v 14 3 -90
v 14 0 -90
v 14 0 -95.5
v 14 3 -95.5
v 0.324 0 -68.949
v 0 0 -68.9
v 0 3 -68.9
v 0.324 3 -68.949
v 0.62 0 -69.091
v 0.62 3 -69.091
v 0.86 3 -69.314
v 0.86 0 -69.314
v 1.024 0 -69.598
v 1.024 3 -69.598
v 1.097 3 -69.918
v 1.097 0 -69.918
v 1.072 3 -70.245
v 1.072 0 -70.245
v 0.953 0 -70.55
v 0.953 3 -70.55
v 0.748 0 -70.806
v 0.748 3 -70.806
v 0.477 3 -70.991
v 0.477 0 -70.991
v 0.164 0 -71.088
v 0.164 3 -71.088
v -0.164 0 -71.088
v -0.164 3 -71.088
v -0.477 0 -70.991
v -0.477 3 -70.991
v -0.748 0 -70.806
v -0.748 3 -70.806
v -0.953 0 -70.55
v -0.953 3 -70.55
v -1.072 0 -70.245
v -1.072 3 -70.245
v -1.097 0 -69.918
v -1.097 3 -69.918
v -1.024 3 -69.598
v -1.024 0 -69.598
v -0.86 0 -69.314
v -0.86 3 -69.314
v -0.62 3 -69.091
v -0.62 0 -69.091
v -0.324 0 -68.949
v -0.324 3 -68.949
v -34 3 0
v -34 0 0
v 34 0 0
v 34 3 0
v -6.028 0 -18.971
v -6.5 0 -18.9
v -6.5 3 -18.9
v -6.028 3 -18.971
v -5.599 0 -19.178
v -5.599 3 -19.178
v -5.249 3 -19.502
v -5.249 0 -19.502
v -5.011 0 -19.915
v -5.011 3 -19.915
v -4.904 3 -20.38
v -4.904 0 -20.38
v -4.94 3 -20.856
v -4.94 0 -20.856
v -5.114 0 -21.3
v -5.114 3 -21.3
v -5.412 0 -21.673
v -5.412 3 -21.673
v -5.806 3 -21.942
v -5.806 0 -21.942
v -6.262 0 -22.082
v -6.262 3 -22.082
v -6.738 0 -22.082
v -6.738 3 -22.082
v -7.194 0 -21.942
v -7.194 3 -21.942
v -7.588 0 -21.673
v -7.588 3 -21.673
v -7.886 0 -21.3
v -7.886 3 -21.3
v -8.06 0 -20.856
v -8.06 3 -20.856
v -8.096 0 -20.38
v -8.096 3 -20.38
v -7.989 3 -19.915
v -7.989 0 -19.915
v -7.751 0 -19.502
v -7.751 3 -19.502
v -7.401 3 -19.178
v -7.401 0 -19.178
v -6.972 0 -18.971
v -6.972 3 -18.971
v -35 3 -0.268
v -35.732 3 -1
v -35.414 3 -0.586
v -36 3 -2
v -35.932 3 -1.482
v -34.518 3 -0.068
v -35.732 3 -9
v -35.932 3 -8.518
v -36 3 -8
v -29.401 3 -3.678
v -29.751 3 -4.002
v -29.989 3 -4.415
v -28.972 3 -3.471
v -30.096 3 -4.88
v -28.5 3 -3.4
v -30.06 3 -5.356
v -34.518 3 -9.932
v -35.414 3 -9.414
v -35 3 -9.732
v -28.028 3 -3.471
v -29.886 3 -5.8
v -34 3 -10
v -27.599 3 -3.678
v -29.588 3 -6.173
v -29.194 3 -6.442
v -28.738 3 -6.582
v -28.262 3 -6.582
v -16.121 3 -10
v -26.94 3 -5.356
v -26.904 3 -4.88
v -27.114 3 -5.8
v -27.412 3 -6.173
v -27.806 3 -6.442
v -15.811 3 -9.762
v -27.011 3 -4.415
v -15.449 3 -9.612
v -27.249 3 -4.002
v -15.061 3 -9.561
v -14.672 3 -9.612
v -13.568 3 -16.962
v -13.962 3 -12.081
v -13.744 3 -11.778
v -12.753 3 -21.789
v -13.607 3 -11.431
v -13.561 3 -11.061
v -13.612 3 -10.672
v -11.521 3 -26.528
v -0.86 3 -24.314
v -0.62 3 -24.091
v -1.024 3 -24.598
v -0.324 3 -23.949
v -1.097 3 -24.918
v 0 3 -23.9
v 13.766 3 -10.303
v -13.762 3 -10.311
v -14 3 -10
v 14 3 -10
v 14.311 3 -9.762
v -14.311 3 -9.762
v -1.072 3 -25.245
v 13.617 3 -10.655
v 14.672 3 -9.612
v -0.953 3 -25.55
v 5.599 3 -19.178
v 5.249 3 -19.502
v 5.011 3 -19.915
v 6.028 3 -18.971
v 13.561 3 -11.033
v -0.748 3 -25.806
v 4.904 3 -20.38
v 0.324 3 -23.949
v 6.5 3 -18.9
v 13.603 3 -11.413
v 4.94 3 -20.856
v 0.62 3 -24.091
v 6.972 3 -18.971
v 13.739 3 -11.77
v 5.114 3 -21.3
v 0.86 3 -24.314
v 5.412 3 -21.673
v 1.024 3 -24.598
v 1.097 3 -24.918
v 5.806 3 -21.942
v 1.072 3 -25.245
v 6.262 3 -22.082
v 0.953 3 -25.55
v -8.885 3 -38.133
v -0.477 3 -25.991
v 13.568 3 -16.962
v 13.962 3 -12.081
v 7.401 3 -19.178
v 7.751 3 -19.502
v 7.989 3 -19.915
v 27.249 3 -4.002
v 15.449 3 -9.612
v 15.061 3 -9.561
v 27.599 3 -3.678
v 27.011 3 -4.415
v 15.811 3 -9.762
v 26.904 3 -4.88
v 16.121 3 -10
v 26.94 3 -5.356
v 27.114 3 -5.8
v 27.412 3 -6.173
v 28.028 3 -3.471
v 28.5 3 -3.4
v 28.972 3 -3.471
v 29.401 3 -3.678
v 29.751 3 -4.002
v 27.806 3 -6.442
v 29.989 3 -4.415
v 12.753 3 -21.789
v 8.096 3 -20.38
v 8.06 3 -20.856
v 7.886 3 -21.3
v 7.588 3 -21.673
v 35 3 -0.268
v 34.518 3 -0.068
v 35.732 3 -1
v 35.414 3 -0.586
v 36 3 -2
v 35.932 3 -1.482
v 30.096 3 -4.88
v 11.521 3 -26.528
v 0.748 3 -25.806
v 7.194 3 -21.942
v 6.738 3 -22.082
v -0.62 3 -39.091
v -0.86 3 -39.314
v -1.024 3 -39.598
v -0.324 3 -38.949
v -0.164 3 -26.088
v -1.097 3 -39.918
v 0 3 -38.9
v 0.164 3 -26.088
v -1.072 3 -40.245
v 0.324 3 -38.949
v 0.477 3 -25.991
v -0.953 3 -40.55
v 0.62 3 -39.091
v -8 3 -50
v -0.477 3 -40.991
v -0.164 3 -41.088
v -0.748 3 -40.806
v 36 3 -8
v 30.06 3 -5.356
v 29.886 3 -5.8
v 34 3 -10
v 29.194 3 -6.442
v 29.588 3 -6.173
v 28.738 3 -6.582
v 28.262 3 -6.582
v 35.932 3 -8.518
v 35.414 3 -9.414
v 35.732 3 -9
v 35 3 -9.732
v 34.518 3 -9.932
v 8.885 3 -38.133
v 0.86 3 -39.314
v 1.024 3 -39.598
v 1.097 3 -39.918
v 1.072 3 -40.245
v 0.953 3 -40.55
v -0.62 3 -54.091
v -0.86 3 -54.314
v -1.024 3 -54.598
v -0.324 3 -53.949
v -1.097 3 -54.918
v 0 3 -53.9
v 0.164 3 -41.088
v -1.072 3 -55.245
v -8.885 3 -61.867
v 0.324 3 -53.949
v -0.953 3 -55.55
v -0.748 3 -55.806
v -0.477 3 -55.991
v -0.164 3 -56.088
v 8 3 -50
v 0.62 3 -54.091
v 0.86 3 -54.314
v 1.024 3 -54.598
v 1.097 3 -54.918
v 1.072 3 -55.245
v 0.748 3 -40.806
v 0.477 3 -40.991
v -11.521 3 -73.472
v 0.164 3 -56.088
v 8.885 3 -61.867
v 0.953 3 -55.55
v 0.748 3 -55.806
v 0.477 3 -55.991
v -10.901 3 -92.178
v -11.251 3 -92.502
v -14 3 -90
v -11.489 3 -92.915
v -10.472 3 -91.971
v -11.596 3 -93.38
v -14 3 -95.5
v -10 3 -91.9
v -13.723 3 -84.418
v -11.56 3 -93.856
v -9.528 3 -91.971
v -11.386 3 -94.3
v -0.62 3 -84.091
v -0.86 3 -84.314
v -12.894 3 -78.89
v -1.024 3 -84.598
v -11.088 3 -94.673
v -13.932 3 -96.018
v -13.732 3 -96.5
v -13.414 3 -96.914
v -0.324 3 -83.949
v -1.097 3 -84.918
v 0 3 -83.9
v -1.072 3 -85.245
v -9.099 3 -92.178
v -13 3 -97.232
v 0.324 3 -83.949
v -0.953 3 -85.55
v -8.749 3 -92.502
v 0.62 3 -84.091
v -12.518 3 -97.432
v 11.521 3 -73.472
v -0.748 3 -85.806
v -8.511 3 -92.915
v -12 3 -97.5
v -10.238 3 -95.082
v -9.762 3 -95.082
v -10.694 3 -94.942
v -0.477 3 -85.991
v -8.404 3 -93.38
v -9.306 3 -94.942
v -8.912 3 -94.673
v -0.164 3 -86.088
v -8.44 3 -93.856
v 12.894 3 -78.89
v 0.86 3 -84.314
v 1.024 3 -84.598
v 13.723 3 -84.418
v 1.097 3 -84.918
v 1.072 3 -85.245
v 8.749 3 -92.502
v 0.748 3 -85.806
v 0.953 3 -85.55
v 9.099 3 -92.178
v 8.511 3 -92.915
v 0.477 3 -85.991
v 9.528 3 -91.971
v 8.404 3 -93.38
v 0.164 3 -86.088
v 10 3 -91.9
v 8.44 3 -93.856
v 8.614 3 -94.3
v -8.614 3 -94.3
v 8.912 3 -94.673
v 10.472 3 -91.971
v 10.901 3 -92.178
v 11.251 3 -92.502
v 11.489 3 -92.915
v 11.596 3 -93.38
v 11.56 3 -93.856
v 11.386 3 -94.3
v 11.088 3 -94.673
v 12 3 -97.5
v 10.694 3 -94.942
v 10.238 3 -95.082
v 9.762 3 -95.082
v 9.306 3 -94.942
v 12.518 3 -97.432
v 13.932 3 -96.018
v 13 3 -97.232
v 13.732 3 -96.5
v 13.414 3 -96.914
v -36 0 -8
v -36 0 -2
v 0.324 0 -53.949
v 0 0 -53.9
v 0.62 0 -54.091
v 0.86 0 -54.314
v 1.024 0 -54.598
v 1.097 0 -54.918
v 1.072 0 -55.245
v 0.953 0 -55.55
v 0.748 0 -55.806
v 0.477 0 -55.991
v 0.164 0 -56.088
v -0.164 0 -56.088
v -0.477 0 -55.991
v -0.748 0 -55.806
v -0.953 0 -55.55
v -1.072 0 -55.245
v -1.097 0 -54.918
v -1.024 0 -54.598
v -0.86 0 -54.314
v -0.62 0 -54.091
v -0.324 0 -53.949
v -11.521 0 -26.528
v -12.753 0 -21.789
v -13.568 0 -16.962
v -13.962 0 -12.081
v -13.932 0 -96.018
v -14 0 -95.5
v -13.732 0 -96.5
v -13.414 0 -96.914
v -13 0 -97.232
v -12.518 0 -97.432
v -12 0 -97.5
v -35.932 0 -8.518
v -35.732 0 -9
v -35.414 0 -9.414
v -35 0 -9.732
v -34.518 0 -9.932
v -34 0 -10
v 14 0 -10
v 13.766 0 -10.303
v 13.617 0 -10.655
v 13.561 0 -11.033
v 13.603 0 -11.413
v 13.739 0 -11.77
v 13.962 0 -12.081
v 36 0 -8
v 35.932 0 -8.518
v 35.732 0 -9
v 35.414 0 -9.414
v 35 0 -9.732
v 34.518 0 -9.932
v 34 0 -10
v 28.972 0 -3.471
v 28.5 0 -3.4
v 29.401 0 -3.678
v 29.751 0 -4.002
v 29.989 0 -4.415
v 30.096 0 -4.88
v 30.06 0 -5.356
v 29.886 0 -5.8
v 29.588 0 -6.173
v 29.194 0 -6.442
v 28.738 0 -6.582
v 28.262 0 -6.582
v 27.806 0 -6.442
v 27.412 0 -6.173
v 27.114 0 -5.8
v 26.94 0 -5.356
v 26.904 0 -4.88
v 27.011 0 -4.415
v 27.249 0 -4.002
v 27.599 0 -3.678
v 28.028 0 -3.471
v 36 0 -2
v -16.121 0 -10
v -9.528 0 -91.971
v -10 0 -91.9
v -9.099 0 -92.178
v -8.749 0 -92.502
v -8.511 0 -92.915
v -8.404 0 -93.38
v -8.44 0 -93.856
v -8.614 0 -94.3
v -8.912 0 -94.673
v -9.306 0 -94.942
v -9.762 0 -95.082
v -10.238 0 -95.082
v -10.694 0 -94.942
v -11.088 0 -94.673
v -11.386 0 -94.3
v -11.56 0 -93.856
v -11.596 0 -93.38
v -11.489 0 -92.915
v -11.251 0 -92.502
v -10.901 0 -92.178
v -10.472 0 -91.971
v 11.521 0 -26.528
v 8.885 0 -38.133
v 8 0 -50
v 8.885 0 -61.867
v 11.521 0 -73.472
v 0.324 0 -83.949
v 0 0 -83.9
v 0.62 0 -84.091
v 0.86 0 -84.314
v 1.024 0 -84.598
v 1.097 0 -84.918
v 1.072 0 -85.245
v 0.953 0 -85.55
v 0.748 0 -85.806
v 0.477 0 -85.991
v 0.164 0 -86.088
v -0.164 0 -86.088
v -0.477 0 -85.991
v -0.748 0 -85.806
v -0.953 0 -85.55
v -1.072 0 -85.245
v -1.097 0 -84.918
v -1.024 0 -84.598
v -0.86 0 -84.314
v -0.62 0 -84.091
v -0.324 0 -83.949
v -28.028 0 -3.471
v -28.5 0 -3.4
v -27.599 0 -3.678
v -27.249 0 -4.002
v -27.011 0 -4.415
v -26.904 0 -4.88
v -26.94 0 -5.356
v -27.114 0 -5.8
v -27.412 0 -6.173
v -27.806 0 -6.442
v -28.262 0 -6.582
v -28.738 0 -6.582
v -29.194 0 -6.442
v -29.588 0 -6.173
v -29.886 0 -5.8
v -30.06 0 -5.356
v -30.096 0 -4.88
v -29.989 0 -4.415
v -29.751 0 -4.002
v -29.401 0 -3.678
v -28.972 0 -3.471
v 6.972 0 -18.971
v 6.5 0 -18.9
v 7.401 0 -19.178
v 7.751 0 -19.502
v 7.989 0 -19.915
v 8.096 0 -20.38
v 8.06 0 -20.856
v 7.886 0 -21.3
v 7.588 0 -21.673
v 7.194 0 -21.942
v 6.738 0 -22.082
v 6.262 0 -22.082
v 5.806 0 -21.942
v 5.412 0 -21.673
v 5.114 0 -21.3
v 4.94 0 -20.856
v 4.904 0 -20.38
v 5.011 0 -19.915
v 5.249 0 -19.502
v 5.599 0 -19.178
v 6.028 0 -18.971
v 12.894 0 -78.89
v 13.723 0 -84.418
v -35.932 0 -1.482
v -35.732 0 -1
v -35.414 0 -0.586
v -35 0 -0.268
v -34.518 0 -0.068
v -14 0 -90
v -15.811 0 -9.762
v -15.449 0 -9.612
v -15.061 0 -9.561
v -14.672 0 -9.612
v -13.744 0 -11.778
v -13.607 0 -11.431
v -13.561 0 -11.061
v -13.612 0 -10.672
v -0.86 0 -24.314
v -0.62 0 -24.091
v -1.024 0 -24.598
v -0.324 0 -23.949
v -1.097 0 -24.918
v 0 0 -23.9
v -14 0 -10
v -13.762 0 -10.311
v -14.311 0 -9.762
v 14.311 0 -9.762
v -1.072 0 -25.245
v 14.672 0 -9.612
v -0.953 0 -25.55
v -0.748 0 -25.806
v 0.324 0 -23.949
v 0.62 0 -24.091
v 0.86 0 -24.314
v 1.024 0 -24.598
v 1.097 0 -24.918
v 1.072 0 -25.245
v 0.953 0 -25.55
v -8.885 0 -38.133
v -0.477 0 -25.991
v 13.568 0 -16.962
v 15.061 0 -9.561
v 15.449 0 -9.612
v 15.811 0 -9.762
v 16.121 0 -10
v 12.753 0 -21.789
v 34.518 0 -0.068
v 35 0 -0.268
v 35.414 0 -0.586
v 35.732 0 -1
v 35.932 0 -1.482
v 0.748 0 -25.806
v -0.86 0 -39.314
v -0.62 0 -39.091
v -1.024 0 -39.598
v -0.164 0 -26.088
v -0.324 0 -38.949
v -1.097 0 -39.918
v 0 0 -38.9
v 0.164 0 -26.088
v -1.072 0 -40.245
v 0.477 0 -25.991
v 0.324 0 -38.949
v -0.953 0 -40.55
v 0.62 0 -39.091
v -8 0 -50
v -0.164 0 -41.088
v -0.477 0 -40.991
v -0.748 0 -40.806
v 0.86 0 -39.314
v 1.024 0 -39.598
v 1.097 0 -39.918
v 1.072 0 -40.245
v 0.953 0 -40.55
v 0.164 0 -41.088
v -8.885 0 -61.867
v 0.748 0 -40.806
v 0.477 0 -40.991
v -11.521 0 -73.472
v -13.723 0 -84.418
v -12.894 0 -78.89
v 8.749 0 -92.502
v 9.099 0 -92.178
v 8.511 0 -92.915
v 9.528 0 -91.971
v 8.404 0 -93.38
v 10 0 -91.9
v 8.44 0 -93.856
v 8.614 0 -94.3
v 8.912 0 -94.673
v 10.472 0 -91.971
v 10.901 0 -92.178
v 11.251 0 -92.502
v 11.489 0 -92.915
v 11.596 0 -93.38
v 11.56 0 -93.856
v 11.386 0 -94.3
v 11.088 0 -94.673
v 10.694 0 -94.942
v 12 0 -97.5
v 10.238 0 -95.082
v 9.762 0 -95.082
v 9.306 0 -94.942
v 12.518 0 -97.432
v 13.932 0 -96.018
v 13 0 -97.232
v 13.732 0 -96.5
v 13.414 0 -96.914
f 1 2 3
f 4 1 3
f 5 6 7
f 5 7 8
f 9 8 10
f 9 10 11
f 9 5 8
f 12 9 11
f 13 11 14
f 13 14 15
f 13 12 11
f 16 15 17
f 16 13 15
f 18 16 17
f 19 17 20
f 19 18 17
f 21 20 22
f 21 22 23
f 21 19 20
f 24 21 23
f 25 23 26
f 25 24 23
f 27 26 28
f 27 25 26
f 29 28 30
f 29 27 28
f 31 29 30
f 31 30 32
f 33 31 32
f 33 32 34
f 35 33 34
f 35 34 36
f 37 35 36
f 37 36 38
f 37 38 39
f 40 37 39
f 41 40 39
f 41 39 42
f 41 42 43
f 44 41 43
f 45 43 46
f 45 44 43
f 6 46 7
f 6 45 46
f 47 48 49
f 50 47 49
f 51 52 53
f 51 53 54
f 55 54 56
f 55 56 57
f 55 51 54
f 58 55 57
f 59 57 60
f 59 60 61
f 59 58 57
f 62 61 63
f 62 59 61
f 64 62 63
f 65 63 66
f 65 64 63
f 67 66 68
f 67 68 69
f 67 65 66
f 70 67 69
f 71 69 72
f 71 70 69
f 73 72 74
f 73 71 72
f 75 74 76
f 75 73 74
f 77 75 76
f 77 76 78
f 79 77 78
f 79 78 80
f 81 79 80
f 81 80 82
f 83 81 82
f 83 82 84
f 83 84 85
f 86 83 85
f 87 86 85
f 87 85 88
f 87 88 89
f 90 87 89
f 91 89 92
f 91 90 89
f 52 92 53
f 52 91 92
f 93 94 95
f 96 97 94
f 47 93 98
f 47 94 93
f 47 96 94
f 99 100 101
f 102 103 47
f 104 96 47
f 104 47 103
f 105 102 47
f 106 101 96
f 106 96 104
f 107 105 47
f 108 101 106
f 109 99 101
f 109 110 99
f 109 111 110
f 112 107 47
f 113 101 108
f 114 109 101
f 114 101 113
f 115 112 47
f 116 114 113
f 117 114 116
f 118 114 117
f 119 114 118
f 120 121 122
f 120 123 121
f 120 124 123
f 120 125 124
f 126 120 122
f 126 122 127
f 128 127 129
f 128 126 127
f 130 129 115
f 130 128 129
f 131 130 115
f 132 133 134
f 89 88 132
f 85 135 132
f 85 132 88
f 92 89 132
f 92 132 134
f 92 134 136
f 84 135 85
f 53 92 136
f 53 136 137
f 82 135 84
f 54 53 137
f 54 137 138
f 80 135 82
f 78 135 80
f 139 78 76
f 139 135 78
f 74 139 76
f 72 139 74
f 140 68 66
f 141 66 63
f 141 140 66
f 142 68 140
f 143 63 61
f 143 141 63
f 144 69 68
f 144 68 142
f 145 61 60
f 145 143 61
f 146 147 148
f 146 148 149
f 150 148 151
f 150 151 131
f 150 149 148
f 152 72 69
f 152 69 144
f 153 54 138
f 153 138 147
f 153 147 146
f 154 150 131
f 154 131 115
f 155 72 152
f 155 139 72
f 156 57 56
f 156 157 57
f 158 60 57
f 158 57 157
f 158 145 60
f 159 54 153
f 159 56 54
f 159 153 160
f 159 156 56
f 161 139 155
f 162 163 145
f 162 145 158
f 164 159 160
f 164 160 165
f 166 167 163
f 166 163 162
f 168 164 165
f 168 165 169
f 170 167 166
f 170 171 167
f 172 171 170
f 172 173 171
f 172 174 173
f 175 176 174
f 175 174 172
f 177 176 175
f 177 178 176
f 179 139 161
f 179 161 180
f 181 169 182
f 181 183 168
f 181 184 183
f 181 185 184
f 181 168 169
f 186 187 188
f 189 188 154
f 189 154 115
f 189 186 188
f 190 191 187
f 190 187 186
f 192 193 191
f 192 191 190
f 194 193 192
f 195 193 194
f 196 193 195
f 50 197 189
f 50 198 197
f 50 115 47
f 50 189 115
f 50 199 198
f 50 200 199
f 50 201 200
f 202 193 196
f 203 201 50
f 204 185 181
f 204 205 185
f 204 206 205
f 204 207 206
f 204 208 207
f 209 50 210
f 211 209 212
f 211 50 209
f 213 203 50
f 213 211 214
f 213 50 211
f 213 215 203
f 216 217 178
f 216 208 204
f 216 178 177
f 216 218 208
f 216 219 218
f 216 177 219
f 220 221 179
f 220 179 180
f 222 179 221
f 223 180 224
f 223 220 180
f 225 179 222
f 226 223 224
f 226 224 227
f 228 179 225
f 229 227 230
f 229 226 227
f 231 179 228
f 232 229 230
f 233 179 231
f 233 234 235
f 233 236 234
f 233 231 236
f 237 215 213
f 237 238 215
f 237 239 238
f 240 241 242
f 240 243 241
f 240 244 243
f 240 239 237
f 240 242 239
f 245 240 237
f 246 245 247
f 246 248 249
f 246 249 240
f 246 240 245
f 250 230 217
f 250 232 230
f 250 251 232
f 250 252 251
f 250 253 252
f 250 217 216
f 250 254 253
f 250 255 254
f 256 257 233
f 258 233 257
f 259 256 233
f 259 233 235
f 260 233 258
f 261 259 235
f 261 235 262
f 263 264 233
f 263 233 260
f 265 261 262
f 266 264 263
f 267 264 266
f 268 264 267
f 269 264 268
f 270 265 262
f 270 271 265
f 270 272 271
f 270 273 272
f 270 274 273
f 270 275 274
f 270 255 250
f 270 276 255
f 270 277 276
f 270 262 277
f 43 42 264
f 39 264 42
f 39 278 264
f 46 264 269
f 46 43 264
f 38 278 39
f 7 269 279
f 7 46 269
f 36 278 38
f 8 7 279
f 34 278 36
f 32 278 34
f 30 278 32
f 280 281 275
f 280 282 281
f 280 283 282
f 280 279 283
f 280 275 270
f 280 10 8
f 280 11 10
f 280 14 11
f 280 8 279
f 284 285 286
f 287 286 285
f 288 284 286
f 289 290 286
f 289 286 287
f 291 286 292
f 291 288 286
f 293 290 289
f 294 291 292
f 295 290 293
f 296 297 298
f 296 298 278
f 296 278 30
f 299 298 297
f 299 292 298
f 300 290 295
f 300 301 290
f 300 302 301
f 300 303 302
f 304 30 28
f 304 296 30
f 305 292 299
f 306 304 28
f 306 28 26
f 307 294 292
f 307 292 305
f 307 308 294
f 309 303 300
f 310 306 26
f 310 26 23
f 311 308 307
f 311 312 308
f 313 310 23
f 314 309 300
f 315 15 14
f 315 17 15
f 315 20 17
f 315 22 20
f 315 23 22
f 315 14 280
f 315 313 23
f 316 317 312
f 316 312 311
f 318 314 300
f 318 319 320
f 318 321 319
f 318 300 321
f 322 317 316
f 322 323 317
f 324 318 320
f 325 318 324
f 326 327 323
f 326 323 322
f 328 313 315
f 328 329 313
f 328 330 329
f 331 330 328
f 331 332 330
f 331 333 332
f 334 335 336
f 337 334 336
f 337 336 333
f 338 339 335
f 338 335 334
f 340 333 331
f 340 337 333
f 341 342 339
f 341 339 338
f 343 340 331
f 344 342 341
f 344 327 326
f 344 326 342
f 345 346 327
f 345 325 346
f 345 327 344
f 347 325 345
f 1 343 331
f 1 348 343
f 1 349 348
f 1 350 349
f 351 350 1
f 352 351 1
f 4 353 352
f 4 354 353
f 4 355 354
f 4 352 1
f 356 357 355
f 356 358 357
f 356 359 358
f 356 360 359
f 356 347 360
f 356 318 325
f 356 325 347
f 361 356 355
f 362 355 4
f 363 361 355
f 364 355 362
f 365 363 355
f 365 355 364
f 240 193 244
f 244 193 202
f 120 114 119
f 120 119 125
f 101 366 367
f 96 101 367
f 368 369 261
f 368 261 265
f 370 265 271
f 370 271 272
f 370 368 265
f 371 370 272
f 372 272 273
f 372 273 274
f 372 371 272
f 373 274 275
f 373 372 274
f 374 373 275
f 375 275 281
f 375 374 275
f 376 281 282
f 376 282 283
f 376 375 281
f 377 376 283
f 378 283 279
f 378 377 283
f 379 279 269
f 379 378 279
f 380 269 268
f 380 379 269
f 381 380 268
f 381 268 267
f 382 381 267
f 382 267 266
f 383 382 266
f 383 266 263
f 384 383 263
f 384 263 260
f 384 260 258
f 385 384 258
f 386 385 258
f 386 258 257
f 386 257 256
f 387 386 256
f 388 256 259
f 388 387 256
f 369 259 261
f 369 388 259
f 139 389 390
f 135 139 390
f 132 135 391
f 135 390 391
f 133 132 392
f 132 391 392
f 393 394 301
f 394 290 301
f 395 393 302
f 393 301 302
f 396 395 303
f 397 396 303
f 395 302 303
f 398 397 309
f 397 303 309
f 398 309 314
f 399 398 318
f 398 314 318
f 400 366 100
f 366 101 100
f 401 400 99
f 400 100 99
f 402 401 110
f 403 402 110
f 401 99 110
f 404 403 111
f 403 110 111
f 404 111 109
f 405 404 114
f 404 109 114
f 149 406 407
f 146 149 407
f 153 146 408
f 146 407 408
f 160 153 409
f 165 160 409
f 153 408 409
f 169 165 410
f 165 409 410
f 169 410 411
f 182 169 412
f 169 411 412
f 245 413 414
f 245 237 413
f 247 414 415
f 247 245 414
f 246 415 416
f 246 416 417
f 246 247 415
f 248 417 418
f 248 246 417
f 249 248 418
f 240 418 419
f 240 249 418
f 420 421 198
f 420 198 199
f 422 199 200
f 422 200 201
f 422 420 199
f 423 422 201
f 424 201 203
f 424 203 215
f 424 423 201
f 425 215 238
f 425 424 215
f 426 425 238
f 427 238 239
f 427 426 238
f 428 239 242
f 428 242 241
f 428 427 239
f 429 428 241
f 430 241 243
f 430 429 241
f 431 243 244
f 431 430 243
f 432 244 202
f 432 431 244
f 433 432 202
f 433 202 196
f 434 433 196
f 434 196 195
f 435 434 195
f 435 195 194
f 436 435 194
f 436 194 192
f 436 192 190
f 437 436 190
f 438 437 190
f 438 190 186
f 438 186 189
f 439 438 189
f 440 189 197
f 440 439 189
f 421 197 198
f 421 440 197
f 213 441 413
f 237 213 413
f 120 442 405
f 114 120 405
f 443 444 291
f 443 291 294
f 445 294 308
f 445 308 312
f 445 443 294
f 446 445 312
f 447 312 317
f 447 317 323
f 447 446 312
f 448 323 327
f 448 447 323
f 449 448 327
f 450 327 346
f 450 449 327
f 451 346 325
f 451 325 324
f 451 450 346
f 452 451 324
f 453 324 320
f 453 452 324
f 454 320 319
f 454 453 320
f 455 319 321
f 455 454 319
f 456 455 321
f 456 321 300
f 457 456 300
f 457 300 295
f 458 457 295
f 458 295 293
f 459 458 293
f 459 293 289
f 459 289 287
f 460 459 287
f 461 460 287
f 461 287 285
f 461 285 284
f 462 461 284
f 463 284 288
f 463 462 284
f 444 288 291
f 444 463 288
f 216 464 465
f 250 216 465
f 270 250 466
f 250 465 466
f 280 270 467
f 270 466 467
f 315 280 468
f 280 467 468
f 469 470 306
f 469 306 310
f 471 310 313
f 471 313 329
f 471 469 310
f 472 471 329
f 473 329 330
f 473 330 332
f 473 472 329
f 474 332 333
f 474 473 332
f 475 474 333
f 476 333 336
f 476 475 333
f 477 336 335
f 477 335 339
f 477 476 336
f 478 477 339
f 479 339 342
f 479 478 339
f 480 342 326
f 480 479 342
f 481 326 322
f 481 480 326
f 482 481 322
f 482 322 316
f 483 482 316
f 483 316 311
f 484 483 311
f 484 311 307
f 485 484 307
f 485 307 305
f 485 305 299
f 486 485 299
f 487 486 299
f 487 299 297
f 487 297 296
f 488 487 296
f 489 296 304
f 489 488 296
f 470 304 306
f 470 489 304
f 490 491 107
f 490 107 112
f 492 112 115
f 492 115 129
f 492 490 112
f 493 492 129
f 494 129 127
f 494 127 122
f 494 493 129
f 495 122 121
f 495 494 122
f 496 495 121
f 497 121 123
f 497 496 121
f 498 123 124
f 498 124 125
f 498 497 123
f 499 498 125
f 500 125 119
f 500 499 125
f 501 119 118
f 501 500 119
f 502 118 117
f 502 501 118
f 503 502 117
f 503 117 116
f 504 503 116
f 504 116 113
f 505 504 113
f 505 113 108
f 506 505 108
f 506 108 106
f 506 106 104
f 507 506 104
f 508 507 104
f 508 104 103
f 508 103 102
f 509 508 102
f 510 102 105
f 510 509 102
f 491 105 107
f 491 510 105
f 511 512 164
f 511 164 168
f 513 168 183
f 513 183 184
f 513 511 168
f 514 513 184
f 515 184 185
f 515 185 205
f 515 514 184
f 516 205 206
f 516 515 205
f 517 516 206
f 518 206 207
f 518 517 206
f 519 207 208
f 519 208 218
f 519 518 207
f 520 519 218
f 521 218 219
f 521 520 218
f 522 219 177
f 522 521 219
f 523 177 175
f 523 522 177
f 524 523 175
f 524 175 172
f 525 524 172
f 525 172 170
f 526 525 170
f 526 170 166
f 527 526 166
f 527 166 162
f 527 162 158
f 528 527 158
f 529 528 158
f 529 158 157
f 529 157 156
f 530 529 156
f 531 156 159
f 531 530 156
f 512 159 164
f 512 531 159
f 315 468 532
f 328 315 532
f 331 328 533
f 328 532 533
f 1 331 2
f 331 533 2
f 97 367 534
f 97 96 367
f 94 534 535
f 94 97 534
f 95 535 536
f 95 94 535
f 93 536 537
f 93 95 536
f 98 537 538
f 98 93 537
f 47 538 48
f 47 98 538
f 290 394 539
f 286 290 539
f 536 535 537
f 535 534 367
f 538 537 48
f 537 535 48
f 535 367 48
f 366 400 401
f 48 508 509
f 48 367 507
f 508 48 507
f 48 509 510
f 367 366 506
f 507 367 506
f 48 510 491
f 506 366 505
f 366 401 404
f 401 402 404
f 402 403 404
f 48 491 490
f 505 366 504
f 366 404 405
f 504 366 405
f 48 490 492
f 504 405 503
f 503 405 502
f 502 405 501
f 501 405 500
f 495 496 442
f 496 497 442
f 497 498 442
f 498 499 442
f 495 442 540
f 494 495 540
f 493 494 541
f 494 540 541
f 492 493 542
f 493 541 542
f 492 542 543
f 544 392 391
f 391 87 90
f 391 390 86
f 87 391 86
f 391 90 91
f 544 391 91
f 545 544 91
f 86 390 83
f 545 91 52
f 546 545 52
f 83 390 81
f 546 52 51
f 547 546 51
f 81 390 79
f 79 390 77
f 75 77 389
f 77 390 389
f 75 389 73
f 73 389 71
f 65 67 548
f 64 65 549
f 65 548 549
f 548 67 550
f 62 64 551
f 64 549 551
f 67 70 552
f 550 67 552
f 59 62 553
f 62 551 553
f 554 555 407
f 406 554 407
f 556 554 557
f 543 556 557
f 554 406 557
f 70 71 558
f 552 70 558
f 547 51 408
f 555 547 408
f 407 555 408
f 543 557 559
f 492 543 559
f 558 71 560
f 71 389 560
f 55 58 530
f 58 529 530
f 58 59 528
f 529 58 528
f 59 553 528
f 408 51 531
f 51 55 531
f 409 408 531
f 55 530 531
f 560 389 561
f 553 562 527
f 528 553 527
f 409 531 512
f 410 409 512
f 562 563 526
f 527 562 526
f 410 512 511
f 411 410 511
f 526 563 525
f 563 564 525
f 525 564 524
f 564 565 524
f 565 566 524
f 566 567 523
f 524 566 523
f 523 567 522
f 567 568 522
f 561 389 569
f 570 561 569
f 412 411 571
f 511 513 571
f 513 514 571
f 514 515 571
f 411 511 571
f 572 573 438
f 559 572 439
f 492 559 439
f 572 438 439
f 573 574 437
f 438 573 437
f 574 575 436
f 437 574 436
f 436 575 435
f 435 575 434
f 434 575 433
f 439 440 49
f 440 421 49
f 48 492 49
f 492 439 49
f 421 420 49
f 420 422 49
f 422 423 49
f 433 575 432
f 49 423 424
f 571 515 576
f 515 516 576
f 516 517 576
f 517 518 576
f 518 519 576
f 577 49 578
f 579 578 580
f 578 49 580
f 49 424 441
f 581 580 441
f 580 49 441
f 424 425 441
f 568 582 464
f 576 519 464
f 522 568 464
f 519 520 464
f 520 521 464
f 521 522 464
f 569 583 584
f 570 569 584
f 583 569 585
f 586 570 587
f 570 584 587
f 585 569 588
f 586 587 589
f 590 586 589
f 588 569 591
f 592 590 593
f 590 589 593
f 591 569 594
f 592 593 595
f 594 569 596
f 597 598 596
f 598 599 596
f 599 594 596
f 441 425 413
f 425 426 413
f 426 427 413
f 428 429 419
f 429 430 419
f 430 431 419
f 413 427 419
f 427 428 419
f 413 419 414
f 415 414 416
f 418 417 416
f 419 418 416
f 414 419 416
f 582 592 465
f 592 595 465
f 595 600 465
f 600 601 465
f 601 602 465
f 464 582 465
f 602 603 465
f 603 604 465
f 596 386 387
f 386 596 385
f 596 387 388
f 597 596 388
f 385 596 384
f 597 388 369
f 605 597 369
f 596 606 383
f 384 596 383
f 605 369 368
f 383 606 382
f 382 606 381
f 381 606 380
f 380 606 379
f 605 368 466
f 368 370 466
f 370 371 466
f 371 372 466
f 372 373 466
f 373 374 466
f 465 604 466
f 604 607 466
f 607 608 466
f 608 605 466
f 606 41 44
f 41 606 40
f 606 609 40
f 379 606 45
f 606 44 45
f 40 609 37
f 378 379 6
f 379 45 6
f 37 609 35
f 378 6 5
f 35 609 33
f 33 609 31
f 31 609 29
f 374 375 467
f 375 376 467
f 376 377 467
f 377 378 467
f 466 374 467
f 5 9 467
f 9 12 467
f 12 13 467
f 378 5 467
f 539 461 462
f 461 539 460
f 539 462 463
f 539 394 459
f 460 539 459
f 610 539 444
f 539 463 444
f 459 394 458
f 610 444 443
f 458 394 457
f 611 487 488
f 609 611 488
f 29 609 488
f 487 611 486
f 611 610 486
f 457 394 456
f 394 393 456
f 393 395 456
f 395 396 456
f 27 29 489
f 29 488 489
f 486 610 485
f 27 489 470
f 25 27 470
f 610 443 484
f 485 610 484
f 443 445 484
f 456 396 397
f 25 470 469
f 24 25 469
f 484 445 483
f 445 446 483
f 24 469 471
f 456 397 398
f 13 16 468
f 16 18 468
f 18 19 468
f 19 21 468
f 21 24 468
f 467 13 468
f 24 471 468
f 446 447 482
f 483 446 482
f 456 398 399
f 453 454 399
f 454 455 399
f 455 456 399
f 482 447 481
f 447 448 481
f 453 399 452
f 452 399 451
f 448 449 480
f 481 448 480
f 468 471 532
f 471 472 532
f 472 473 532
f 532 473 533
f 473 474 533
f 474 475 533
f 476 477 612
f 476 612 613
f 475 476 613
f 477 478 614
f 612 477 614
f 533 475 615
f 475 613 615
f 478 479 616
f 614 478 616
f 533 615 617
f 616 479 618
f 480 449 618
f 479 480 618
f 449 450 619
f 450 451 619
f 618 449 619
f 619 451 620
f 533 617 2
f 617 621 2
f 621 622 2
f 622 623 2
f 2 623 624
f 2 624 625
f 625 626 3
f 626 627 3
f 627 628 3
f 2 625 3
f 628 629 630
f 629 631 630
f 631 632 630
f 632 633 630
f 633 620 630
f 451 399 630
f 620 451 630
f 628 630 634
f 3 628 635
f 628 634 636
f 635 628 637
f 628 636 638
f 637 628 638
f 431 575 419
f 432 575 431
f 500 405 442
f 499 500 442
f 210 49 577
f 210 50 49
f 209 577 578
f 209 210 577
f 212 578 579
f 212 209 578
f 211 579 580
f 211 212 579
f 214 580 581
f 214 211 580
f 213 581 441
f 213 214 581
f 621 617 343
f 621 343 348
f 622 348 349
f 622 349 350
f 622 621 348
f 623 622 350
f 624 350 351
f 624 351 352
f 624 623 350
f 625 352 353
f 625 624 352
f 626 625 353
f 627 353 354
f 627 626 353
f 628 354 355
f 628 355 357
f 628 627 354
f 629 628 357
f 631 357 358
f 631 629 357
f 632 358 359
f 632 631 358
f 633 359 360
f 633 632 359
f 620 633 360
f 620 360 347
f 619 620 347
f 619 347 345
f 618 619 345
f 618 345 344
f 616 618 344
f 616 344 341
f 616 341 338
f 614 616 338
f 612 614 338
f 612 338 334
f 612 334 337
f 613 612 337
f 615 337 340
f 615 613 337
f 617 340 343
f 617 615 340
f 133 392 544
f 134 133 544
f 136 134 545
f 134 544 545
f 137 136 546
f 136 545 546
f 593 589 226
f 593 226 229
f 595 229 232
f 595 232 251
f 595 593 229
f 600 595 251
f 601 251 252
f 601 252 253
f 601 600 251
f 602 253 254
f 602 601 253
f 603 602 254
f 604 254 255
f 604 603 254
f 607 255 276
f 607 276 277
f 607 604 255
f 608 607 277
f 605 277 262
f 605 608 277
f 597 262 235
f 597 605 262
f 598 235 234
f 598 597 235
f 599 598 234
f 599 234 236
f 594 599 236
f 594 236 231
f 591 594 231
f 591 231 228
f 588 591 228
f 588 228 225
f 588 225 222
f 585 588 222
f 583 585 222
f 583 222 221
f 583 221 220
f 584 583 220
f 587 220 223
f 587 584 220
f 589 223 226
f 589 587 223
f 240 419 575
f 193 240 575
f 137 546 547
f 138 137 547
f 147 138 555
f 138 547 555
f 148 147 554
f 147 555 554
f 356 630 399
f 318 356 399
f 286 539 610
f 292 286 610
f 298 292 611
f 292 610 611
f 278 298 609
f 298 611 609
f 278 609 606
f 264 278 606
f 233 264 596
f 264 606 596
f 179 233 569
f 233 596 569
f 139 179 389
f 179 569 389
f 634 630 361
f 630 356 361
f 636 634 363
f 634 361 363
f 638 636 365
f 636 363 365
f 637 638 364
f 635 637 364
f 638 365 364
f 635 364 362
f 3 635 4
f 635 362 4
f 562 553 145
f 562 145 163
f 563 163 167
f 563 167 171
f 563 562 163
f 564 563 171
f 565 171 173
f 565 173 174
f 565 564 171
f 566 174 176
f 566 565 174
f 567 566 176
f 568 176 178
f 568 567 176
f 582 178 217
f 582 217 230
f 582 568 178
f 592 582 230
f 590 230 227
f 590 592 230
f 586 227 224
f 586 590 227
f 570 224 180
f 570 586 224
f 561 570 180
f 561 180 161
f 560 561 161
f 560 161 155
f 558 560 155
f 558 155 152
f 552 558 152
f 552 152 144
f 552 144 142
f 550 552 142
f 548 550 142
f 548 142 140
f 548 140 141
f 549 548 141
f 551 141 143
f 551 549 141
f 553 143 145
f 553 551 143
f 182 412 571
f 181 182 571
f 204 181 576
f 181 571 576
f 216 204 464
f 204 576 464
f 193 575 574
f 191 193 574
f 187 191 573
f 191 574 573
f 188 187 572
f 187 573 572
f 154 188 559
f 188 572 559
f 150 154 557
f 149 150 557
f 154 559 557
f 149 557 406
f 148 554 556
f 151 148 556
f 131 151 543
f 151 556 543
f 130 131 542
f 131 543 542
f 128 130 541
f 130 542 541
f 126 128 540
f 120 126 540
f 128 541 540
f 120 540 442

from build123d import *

# Parameters (mm, degrees)
SKETCH_1_R      = 1.6
SKETCH_1_R_2    = 1.1
EXTRUDE_1_DEPTH = 3
FILLET_1_R      = 2


with BuildPart() as part:
    # 草图1 → 凸台-拉伸1 (new body)
    with BuildSketch(Plane(origin=(0, 0, 0), x_dir=(1, 0, 0), z_dir=(0, 1, 0))):
        with BuildLine():
            Line((-36, 10), (-36, 0))
            Line((-36, 0), (36, 0))
            Line((36, 0), (36, 10))
            Line((36, 10), (16.121320344, 10))
            ThreePointArc((16.121320344, 10), (15.060660172, 9.560660172), (14, 10))
            ThreePointArc((14, 10), (13.560916248, 11.032944403), (13.961534907, 12.081406787))
            ThreePointArc((13.961534907, 12.081406787), (13.212832412, 19.384450727), (11.520782396, 26.528117359))
            ThreePointArc((11.520782396, 26.528117359), (8, 50), (11.520782396, 73.471882641))
            ThreePointArc((11.520782396, 73.471882641), (13.376747878, 81.643487818), (14, 90))
            Line((14, 90), (14, 97.5))
            Line((14, 97.5), (-14, 97.5))
            Line((-14, 97.5), (-14, 90))
            ThreePointArc((-14, 90), (-13.376747878, 81.643487818), (-11.520782396, 73.471882641))
            ThreePointArc((-11.520782396, 73.471882641), (-8, 50), (-11.520782396, 26.528117359))
            ThreePointArc((-11.520782396, 26.528117359), (-13.212832412, 19.384450727), (-13.961534907, 12.081406787))
            ThreePointArc((-13.961534907, 12.081406787), (-13.664471091, 11.608981293), (-13.560660172, 11.060660172))
            ThreePointArc((-13.560660172, 11.060660172), (-13.674840873, 10.486635023), (-14, 10))
            ThreePointArc((-14, 10), (-15.060660172, 9.560660172), (-16.121320344, 10))
            Line((-16.121320344, 10), (-36, 10))
        make_face()
        with Locations(Location((-28.5, 5, 0), (0, 0, 270))):
            Circle(SKETCH_1_R, mode=Mode.SUBTRACT)
        with Locations(Location((-6.5, 20.5, 0), (0, 0, 270))):
            Circle(SKETCH_1_R, mode=Mode.SUBTRACT)
        with Locations(Location((6.5, 20.5, 0), (0, 0, 270))):
            Circle(SKETCH_1_R, mode=Mode.SUBTRACT)
        with Locations(Location((28.5, 5, 0), (0, 0, 270))):
            Circle(SKETCH_1_R, mode=Mode.SUBTRACT)
        with Locations(Location((0, 25, 0), (0, 0, 270))):
            Circle(SKETCH_1_R_2, mode=Mode.SUBTRACT)
        with Locations(Location((0, 40, 0), (0, 0, 270))):
            Circle(SKETCH_1_R_2, mode=Mode.SUBTRACT)
        with Locations(Location((-10, 93.5, 0), (0, 0, 270))):
            Circle(SKETCH_1_R, mode=Mode.SUBTRACT)
        with Locations(Location((0, 55, 0), (0, 0, 270))):
            Circle(SKETCH_1_R_2, mode=Mode.SUBTRACT)
        with Locations(Location((0, 70, 0), (0, 0, 270))):
            Circle(SKETCH_1_R_2, mode=Mode.SUBTRACT)
        with Locations(Location((0, 85, 0), (0, 0, 270))):
            Circle(SKETCH_1_R_2, mode=Mode.SUBTRACT)
        with Locations(Location((10, 93.5, 0), (0, 0, 270))):
            Circle(SKETCH_1_R, mode=Mode.SUBTRACT)
    extrude(amount=EXTRUDE_1_DEPTH)

    # 圆角1
    fillet_1_edges = [part.edges().sort_by_distance(p)[0] for p in [
        (36, 1.5, -10),
        (36, 1.5, 0),
        (-36, 1.5, 0),
        (-36, 1.5, -10),
        (-14, 1.5, -97.5),
        (14, 1.5, -97.5),
    ]]
    fillet(fillet_1_edges, radius=FILLET_1_R)


solid = part.part
